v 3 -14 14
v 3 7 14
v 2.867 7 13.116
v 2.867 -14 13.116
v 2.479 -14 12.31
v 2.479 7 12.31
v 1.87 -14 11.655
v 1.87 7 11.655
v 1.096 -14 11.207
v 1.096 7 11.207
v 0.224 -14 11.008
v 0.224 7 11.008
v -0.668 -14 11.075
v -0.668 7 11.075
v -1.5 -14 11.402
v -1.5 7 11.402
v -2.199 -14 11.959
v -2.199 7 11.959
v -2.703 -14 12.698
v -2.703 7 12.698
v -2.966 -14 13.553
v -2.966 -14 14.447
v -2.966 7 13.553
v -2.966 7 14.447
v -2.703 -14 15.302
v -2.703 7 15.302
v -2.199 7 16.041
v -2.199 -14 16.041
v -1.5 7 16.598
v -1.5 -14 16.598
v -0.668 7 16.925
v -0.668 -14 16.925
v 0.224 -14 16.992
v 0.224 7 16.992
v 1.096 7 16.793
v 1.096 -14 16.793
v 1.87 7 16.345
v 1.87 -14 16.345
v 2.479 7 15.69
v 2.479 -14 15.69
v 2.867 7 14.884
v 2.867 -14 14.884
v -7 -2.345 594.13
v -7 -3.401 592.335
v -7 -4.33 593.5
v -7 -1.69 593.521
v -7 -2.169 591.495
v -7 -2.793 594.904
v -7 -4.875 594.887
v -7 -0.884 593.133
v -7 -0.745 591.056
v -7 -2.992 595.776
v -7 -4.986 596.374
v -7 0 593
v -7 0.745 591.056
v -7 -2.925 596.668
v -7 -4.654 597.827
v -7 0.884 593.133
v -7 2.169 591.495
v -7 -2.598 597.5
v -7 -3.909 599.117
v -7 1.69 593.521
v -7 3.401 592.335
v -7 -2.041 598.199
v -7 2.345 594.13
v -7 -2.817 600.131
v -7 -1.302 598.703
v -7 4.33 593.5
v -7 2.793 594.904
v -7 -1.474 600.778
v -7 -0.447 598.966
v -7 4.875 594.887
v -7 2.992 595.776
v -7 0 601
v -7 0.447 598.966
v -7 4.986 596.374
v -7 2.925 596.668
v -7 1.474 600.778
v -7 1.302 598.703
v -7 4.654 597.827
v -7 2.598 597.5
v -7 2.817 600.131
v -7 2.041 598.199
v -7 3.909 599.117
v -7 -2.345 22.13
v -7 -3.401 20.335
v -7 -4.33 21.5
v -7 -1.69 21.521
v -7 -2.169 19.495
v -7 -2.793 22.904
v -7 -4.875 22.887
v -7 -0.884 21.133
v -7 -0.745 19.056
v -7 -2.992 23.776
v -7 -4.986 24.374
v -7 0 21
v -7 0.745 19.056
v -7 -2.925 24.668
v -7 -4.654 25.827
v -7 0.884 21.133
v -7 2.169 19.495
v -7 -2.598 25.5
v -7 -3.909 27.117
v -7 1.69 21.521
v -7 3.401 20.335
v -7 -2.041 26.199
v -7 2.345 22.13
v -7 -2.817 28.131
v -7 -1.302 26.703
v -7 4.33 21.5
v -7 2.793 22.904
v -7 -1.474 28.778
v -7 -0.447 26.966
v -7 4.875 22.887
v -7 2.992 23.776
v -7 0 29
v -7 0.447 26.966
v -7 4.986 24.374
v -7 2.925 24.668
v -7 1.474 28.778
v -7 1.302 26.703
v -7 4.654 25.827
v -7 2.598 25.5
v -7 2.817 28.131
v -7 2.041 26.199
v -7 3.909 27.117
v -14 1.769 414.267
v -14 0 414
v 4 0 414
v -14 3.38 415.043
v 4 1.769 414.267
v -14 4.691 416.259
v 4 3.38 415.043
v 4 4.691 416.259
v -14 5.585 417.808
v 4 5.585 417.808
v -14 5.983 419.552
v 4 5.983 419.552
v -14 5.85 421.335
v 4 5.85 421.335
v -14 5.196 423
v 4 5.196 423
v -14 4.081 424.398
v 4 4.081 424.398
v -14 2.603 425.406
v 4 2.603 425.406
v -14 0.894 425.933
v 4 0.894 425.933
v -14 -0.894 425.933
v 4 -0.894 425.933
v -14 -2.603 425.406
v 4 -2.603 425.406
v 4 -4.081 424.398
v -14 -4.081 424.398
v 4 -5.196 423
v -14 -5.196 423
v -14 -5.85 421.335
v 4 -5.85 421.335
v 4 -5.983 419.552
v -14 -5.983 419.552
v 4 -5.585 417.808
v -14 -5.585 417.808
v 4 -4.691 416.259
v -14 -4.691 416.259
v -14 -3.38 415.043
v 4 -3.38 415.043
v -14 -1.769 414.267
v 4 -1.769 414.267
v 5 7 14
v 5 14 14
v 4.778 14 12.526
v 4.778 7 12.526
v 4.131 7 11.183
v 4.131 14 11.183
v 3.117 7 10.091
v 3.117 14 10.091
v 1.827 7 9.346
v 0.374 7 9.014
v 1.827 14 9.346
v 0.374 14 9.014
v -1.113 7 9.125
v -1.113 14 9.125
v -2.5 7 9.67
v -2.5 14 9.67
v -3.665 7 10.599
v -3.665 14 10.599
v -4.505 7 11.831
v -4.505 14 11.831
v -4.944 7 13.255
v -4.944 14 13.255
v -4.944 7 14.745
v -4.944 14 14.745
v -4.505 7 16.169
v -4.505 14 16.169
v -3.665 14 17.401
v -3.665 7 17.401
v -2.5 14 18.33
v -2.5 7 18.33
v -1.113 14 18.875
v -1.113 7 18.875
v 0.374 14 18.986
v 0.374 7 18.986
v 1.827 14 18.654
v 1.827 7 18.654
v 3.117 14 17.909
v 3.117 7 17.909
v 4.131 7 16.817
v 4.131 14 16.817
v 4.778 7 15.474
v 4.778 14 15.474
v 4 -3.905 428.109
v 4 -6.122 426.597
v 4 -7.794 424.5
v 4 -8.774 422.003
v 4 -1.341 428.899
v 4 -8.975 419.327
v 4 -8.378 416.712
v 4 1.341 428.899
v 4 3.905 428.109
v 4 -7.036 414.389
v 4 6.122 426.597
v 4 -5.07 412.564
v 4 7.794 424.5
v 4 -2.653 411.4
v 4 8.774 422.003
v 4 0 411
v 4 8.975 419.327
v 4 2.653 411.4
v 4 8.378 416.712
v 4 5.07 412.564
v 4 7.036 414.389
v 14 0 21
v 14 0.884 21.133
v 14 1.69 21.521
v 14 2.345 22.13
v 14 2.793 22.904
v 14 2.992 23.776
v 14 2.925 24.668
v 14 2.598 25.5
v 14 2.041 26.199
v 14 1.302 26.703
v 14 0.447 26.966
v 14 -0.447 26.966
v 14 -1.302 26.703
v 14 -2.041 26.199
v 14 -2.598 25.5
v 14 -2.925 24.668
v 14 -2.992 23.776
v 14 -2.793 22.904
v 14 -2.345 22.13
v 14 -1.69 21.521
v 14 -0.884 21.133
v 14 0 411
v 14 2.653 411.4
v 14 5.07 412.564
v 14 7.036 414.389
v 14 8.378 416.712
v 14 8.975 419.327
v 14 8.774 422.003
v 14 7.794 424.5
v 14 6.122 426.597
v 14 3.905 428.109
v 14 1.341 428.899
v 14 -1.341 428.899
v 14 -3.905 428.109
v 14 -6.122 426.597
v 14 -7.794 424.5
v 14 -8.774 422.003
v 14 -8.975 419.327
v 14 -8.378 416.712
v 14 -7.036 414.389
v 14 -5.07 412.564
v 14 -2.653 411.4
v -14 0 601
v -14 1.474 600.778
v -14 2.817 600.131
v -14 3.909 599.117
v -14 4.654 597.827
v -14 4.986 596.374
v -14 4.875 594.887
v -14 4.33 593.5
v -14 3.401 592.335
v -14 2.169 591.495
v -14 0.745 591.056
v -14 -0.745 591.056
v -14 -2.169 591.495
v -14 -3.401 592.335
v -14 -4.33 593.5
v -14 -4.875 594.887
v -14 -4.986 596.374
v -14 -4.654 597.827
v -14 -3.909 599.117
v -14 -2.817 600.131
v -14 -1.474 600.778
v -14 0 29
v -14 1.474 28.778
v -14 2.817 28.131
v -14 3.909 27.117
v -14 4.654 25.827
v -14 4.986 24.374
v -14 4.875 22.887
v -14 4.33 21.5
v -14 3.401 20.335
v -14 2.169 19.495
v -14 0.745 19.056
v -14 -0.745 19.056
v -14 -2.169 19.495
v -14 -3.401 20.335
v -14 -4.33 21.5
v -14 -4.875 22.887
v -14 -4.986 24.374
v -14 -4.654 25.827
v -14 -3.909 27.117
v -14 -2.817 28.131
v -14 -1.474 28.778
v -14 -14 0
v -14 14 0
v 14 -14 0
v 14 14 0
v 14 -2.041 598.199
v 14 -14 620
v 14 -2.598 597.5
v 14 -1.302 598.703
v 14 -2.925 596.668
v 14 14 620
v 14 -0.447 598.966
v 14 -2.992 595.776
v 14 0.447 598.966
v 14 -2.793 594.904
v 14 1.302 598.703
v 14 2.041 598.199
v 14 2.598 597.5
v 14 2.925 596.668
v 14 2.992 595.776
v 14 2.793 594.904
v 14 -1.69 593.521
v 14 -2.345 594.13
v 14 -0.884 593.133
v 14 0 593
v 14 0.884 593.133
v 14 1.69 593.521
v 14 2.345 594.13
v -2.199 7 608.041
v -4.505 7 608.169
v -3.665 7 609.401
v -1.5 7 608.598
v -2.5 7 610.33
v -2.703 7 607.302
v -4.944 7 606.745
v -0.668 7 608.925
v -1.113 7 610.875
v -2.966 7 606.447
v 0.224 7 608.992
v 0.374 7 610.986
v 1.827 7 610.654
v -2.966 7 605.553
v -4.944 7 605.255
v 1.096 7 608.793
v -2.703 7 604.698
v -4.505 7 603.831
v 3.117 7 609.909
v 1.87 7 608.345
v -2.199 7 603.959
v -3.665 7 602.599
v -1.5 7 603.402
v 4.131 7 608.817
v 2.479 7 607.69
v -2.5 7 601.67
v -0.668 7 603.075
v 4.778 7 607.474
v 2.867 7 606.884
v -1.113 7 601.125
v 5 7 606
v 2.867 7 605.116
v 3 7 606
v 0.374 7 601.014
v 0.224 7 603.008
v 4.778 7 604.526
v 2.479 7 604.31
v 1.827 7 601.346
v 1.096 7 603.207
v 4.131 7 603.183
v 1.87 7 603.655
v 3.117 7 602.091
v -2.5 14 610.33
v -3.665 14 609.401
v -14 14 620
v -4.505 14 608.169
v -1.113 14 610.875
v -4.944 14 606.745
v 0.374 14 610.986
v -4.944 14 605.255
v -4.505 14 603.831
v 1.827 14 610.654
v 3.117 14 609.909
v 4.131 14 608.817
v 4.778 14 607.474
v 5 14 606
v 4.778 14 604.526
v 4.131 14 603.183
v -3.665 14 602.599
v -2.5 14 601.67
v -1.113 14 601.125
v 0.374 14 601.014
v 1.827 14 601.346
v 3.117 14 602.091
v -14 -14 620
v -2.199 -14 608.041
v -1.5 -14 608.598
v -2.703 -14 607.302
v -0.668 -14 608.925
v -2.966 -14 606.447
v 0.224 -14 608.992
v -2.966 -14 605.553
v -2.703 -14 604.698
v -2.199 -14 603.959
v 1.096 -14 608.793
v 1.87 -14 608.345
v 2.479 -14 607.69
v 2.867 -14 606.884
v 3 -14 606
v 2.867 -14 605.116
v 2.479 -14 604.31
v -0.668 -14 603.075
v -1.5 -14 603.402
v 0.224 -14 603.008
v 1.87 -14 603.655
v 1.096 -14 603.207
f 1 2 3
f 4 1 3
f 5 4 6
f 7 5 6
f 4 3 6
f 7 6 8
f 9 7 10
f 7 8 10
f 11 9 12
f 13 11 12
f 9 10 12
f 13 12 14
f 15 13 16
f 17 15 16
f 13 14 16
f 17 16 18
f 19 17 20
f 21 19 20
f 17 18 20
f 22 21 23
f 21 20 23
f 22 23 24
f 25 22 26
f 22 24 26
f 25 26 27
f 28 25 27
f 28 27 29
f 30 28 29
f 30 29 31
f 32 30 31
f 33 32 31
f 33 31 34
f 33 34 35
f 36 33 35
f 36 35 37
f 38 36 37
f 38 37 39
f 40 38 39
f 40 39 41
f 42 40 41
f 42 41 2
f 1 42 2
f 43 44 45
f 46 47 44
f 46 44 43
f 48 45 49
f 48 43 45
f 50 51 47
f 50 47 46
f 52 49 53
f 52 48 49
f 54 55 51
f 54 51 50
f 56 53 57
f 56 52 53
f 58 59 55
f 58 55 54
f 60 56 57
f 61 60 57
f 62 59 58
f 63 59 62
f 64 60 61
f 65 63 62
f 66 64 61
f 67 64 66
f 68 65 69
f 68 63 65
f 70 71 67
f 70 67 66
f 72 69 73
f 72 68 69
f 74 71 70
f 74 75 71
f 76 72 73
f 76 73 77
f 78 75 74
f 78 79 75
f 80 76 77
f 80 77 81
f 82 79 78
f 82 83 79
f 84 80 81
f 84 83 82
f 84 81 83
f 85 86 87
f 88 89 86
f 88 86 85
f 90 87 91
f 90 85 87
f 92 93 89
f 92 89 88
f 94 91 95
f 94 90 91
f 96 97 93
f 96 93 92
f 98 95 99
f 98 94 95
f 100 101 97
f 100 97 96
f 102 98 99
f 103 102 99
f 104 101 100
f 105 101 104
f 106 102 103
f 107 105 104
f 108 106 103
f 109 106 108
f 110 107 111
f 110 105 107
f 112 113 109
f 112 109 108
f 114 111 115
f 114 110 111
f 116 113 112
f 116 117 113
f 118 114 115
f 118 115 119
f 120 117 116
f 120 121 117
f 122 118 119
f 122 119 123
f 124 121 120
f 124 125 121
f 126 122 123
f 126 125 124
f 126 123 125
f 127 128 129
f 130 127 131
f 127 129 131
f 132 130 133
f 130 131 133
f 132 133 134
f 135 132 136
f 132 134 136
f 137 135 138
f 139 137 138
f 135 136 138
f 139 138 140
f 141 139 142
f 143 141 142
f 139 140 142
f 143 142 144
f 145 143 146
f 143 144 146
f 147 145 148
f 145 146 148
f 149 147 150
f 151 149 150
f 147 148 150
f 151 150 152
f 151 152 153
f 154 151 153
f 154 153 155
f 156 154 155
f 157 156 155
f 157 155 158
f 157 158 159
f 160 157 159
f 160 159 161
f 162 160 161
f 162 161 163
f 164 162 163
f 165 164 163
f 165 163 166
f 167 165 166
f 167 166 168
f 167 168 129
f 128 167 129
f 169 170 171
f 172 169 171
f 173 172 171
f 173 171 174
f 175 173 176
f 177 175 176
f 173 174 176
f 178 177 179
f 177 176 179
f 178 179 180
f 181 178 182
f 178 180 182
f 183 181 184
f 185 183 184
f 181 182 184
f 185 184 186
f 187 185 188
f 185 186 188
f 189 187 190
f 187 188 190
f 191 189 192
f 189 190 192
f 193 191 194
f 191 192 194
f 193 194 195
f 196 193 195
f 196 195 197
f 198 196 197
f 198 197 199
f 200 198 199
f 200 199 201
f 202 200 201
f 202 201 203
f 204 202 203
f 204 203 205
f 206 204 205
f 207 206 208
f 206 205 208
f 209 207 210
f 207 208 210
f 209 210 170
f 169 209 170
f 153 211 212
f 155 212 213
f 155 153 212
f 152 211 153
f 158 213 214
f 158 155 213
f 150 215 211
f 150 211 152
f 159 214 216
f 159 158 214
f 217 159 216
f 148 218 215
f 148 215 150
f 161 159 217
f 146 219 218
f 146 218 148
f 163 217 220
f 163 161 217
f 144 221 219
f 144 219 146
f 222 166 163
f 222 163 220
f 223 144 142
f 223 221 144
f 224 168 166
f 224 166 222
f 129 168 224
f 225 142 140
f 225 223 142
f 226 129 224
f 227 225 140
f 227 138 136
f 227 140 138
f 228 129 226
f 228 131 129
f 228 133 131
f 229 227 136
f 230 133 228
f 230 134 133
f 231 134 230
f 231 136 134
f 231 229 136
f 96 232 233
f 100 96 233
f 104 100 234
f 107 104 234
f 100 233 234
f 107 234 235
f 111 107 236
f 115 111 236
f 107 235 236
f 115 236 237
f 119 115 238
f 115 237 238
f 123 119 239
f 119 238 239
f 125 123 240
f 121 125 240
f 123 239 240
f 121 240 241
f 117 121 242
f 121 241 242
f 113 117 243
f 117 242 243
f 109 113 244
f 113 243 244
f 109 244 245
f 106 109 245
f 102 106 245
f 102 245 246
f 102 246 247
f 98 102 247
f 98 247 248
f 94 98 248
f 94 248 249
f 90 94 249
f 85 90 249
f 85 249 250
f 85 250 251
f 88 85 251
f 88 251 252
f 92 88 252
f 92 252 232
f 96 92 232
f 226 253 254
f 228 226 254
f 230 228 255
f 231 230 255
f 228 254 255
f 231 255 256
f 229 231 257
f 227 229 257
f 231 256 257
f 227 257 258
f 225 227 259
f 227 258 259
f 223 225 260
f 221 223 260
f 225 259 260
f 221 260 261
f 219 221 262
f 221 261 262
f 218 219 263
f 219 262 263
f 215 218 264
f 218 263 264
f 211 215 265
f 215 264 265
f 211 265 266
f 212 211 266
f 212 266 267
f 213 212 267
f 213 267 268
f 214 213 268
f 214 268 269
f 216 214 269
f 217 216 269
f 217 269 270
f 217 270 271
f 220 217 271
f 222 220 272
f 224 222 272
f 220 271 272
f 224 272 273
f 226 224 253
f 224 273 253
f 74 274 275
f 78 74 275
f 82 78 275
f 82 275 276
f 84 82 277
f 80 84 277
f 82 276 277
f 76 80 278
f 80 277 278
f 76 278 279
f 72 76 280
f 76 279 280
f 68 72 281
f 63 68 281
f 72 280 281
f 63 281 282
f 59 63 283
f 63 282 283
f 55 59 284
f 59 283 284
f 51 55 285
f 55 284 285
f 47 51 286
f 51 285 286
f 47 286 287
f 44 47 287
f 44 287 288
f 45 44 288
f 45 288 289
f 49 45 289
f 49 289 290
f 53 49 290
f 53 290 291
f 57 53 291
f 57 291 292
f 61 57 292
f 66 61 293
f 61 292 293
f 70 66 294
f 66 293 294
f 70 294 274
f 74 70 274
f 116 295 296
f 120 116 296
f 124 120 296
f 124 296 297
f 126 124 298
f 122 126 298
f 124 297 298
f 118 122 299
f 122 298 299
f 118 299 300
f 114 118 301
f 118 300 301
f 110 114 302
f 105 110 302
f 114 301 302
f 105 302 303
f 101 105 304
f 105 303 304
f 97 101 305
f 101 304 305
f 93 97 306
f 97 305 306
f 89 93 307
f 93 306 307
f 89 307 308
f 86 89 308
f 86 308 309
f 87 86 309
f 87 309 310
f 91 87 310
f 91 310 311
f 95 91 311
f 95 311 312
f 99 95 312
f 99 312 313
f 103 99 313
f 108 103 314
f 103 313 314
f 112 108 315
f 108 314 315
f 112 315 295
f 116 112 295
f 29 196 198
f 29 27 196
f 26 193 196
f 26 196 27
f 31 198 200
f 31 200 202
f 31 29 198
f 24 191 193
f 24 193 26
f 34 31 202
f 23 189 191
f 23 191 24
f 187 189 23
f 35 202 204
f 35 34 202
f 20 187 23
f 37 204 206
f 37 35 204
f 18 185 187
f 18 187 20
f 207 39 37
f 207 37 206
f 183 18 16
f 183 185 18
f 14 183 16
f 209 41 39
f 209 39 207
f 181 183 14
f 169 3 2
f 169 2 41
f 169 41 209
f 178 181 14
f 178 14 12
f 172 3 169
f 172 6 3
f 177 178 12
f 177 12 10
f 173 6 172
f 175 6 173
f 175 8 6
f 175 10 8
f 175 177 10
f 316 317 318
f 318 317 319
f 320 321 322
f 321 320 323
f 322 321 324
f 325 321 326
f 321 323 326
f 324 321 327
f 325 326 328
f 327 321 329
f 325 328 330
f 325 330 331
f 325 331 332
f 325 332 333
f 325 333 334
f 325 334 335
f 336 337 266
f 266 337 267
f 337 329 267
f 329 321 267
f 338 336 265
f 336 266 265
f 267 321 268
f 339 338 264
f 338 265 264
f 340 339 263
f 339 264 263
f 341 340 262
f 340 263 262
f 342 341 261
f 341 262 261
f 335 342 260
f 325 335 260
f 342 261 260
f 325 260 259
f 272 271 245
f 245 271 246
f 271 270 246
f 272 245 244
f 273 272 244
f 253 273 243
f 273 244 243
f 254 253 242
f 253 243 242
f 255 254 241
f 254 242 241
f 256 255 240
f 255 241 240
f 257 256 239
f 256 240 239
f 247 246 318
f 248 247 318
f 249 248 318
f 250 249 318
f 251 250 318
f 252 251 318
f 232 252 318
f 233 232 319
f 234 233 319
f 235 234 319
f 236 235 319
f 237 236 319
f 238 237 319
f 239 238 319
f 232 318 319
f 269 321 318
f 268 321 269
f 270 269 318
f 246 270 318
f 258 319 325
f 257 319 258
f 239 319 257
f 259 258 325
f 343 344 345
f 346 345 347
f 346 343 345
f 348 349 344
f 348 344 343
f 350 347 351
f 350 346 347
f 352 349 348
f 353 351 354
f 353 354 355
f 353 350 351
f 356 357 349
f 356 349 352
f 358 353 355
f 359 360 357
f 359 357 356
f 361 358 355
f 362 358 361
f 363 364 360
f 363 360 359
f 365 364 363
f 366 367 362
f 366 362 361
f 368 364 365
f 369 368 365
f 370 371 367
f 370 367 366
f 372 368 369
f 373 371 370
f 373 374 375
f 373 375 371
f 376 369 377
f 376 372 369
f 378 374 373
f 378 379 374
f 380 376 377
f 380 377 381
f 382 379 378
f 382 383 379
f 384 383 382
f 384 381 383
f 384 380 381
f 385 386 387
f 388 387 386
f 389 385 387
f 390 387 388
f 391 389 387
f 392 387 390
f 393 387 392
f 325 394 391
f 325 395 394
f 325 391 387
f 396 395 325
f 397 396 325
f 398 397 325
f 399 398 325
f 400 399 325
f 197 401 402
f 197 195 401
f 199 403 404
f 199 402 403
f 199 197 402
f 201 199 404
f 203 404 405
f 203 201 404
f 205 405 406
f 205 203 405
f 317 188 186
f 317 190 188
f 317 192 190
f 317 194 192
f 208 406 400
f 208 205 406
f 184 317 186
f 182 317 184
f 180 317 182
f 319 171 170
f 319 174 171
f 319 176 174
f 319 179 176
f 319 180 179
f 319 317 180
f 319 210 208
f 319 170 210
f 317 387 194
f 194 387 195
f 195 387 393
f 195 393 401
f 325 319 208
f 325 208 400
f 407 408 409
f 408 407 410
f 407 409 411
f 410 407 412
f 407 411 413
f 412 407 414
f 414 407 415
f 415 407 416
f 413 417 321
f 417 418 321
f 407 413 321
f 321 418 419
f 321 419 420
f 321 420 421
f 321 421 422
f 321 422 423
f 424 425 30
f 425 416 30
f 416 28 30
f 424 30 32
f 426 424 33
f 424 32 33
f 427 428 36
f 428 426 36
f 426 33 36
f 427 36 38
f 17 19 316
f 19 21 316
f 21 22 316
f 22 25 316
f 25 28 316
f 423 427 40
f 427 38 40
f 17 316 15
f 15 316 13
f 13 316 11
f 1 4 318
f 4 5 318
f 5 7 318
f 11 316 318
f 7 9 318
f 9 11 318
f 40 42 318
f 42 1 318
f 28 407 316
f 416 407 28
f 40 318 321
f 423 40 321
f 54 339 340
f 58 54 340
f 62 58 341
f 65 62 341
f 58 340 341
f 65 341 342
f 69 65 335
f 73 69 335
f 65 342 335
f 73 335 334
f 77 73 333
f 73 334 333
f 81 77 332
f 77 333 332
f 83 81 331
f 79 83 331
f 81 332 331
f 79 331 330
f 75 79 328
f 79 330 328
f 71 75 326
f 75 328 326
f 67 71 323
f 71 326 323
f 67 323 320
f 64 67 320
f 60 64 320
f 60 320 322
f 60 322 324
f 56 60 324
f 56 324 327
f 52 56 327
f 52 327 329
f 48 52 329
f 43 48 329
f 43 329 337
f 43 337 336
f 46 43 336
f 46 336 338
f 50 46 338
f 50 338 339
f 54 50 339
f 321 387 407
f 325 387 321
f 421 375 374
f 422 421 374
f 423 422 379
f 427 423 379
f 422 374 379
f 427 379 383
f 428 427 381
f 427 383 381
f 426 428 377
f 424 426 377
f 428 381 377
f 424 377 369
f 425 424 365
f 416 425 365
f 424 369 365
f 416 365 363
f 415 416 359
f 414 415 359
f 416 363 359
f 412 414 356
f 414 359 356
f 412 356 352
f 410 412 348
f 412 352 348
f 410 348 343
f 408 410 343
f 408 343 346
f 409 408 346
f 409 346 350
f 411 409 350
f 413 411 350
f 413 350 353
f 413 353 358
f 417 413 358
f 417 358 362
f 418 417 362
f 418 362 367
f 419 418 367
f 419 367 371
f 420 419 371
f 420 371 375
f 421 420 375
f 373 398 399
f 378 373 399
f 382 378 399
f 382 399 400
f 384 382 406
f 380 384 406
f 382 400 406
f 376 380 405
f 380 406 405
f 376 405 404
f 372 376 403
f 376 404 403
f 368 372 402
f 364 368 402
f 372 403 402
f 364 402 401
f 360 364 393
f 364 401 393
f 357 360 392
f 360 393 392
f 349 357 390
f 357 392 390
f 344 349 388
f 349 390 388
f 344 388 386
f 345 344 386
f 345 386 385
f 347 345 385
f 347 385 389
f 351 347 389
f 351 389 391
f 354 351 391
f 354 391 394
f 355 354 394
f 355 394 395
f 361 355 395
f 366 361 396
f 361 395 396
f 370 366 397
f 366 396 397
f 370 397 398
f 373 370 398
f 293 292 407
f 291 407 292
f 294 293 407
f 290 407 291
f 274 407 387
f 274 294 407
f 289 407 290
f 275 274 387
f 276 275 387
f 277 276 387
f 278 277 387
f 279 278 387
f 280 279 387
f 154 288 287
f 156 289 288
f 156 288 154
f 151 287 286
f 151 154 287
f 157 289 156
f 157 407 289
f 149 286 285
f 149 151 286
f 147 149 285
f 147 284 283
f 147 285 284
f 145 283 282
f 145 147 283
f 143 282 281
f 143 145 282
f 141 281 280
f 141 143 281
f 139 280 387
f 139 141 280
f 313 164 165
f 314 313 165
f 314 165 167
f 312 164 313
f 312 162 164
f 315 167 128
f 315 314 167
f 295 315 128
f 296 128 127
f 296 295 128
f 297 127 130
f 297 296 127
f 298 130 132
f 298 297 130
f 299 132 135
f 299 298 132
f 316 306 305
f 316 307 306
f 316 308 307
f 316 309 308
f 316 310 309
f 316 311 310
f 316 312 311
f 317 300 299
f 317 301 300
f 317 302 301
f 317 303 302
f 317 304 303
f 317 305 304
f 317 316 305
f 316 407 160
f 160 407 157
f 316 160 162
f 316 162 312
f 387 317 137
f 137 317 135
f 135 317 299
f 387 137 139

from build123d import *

# Parameters (mm, degrees)
IZIM1_W                     = 28
IZIM1_H                     = 28
Y_KSEKLIK_EKSTR_ZYON1_DEPTH = 620
IZIM3_R                     = 5
KES_EKSTR_ZYON2_DEPTH       = 7
IZIM4_R                     = 3
KES_EKSTR_ZYON3_DEPTH       = 29
IZIM5_R                     = 6
KES_EKSTR_ZYON4_DEPTH       = 29
IZIM6_R                     = 9
KES_EKSTR_ZYON5_DEPTH       = 10
KES_EKSTR_ZYON6_REACH       = 30
IZIM7_R                     = 3
IZIM9_R                     = 5
KES_EKSTR_ZYON8_DEPTH       = 7


with BuildPart() as part:
    # Çizim1 → Yükseklik-Ekstrüzyon1 (new body)
    with BuildSketch(Plane.XY):
        Rectangle(IZIM1_W, IZIM1_H)
    extrude(amount=Y_KSEKLIK_EKSTR_ZYON1_DEPTH)

    # Çizim3 → Kes-Ekstrüzyon2 (cut)
    with BuildSketch(Plane(origin=(0, 14, 0), x_dir=(1, 0, 0), z_dir=(0, 1, 0))):
        with Locations((0, -14)):
            Circle(IZIM3_R)
        with Locations((0, -606)):
            Circle(IZIM3_R)
    extrude(amount=-KES_EKSTR_ZYON2_DEPTH, mode=Mode.SUBTRACT)

    # Çizim4 → Kes-Ekstrüzyon3 (cut, through all)
    with BuildSketch(Plane(origin=(0, 14, 0), x_dir=(1, 0, 0), z_dir=(0, 1, 0))):
        with Locations((0, -606)):
            Circle(IZIM4_R)
        with Locations((0, -14)):
            Circle(IZIM4_R)
    extrude(amount=-KES_EKSTR_ZYON3_DEPTH, mode=Mode.SUBTRACT)

    # Çizim5 → Kes-Ekstrüzyon4 (cut, through all)
    with BuildSketch(Plane(origin=(14, 0, 0), x_dir=(0, 0, -1), z_dir=(1, 0, 0))):
        with Locations((-420, 0)):
            Circle(IZIM5_R)
    extrude(amount=-KES_EKSTR_ZYON4_DEPTH, mode=Mode.SUBTRACT)

    # Çizim6 → Kes-Ekstrüzyon5 (cut)
    with BuildSketch(Plane(origin=(14, 0, 0), x_dir=(0, 0, -1), z_dir=(1, 0, 0))):
        with Locations((-420, 0)):
            Circle(IZIM6_R)
    extrude(amount=-KES_EKSTR_ZYON5_DEPTH, mode=Mode.SUBTRACT)

    # Çizim7 → Kes-Ekstrüzyon6 (cut, up to next)
    with BuildSketch(Plane(origin=(14, 0, 0), x_dir=(0, 0, -1), z_dir=(1, 0, 0)), mode=Mode.PRIVATE) as kes_ekstr_zyon6_sk1:
        with Locations((-24, 0)):
            Circle(IZIM7_R)
    kes_ekstr_zyon6_tool1 = extrude(kes_ekstr_zyon6_sk1.sketch, amount=-KES_EKSTR_ZYON6_REACH, mode=Mode.PRIVATE) & part.part
    add(kes_ekstr_zyon6_tool1.solids().sort_by_distance((14, 0, 24))[0], mode=Mode.SUBTRACT)
    # Çizim7 → Kes-Ekstrüzyon6 (cut, up to next)
    with BuildSketch(Plane(origin=(14, 0, 0), x_dir=(0, 0, -1), z_dir=(1, 0, 0)), mode=Mode.PRIVATE) as kes_ekstr_zyon6_sk2:
        with Locations((-596, 0)):
            Circle(IZIM7_R)
    kes_ekstr_zyon6_tool2 = extrude(kes_ekstr_zyon6_sk2.sketch, amount=-KES_EKSTR_ZYON6_REACH, mode=Mode.PRIVATE) & part.part
    add(kes_ekstr_zyon6_tool2.solids().sort_by_distance((14, 0, 596))[0], mode=Mode.SUBTRACT)

    # Çizim9 → Kes-Ekstrüzyon8 (cut)
    with BuildSketch(Plane.ZY.offset(14)):
        with Locations((596, 0)):
            Circle(IZIM9_R)
        with Locations((24, 0)):
            Circle(IZIM9_R)
    extrude(amount=-KES_EKSTR_ZYON8_DEPTH, mode=Mode.SUBTRACT)


solid = part.part
